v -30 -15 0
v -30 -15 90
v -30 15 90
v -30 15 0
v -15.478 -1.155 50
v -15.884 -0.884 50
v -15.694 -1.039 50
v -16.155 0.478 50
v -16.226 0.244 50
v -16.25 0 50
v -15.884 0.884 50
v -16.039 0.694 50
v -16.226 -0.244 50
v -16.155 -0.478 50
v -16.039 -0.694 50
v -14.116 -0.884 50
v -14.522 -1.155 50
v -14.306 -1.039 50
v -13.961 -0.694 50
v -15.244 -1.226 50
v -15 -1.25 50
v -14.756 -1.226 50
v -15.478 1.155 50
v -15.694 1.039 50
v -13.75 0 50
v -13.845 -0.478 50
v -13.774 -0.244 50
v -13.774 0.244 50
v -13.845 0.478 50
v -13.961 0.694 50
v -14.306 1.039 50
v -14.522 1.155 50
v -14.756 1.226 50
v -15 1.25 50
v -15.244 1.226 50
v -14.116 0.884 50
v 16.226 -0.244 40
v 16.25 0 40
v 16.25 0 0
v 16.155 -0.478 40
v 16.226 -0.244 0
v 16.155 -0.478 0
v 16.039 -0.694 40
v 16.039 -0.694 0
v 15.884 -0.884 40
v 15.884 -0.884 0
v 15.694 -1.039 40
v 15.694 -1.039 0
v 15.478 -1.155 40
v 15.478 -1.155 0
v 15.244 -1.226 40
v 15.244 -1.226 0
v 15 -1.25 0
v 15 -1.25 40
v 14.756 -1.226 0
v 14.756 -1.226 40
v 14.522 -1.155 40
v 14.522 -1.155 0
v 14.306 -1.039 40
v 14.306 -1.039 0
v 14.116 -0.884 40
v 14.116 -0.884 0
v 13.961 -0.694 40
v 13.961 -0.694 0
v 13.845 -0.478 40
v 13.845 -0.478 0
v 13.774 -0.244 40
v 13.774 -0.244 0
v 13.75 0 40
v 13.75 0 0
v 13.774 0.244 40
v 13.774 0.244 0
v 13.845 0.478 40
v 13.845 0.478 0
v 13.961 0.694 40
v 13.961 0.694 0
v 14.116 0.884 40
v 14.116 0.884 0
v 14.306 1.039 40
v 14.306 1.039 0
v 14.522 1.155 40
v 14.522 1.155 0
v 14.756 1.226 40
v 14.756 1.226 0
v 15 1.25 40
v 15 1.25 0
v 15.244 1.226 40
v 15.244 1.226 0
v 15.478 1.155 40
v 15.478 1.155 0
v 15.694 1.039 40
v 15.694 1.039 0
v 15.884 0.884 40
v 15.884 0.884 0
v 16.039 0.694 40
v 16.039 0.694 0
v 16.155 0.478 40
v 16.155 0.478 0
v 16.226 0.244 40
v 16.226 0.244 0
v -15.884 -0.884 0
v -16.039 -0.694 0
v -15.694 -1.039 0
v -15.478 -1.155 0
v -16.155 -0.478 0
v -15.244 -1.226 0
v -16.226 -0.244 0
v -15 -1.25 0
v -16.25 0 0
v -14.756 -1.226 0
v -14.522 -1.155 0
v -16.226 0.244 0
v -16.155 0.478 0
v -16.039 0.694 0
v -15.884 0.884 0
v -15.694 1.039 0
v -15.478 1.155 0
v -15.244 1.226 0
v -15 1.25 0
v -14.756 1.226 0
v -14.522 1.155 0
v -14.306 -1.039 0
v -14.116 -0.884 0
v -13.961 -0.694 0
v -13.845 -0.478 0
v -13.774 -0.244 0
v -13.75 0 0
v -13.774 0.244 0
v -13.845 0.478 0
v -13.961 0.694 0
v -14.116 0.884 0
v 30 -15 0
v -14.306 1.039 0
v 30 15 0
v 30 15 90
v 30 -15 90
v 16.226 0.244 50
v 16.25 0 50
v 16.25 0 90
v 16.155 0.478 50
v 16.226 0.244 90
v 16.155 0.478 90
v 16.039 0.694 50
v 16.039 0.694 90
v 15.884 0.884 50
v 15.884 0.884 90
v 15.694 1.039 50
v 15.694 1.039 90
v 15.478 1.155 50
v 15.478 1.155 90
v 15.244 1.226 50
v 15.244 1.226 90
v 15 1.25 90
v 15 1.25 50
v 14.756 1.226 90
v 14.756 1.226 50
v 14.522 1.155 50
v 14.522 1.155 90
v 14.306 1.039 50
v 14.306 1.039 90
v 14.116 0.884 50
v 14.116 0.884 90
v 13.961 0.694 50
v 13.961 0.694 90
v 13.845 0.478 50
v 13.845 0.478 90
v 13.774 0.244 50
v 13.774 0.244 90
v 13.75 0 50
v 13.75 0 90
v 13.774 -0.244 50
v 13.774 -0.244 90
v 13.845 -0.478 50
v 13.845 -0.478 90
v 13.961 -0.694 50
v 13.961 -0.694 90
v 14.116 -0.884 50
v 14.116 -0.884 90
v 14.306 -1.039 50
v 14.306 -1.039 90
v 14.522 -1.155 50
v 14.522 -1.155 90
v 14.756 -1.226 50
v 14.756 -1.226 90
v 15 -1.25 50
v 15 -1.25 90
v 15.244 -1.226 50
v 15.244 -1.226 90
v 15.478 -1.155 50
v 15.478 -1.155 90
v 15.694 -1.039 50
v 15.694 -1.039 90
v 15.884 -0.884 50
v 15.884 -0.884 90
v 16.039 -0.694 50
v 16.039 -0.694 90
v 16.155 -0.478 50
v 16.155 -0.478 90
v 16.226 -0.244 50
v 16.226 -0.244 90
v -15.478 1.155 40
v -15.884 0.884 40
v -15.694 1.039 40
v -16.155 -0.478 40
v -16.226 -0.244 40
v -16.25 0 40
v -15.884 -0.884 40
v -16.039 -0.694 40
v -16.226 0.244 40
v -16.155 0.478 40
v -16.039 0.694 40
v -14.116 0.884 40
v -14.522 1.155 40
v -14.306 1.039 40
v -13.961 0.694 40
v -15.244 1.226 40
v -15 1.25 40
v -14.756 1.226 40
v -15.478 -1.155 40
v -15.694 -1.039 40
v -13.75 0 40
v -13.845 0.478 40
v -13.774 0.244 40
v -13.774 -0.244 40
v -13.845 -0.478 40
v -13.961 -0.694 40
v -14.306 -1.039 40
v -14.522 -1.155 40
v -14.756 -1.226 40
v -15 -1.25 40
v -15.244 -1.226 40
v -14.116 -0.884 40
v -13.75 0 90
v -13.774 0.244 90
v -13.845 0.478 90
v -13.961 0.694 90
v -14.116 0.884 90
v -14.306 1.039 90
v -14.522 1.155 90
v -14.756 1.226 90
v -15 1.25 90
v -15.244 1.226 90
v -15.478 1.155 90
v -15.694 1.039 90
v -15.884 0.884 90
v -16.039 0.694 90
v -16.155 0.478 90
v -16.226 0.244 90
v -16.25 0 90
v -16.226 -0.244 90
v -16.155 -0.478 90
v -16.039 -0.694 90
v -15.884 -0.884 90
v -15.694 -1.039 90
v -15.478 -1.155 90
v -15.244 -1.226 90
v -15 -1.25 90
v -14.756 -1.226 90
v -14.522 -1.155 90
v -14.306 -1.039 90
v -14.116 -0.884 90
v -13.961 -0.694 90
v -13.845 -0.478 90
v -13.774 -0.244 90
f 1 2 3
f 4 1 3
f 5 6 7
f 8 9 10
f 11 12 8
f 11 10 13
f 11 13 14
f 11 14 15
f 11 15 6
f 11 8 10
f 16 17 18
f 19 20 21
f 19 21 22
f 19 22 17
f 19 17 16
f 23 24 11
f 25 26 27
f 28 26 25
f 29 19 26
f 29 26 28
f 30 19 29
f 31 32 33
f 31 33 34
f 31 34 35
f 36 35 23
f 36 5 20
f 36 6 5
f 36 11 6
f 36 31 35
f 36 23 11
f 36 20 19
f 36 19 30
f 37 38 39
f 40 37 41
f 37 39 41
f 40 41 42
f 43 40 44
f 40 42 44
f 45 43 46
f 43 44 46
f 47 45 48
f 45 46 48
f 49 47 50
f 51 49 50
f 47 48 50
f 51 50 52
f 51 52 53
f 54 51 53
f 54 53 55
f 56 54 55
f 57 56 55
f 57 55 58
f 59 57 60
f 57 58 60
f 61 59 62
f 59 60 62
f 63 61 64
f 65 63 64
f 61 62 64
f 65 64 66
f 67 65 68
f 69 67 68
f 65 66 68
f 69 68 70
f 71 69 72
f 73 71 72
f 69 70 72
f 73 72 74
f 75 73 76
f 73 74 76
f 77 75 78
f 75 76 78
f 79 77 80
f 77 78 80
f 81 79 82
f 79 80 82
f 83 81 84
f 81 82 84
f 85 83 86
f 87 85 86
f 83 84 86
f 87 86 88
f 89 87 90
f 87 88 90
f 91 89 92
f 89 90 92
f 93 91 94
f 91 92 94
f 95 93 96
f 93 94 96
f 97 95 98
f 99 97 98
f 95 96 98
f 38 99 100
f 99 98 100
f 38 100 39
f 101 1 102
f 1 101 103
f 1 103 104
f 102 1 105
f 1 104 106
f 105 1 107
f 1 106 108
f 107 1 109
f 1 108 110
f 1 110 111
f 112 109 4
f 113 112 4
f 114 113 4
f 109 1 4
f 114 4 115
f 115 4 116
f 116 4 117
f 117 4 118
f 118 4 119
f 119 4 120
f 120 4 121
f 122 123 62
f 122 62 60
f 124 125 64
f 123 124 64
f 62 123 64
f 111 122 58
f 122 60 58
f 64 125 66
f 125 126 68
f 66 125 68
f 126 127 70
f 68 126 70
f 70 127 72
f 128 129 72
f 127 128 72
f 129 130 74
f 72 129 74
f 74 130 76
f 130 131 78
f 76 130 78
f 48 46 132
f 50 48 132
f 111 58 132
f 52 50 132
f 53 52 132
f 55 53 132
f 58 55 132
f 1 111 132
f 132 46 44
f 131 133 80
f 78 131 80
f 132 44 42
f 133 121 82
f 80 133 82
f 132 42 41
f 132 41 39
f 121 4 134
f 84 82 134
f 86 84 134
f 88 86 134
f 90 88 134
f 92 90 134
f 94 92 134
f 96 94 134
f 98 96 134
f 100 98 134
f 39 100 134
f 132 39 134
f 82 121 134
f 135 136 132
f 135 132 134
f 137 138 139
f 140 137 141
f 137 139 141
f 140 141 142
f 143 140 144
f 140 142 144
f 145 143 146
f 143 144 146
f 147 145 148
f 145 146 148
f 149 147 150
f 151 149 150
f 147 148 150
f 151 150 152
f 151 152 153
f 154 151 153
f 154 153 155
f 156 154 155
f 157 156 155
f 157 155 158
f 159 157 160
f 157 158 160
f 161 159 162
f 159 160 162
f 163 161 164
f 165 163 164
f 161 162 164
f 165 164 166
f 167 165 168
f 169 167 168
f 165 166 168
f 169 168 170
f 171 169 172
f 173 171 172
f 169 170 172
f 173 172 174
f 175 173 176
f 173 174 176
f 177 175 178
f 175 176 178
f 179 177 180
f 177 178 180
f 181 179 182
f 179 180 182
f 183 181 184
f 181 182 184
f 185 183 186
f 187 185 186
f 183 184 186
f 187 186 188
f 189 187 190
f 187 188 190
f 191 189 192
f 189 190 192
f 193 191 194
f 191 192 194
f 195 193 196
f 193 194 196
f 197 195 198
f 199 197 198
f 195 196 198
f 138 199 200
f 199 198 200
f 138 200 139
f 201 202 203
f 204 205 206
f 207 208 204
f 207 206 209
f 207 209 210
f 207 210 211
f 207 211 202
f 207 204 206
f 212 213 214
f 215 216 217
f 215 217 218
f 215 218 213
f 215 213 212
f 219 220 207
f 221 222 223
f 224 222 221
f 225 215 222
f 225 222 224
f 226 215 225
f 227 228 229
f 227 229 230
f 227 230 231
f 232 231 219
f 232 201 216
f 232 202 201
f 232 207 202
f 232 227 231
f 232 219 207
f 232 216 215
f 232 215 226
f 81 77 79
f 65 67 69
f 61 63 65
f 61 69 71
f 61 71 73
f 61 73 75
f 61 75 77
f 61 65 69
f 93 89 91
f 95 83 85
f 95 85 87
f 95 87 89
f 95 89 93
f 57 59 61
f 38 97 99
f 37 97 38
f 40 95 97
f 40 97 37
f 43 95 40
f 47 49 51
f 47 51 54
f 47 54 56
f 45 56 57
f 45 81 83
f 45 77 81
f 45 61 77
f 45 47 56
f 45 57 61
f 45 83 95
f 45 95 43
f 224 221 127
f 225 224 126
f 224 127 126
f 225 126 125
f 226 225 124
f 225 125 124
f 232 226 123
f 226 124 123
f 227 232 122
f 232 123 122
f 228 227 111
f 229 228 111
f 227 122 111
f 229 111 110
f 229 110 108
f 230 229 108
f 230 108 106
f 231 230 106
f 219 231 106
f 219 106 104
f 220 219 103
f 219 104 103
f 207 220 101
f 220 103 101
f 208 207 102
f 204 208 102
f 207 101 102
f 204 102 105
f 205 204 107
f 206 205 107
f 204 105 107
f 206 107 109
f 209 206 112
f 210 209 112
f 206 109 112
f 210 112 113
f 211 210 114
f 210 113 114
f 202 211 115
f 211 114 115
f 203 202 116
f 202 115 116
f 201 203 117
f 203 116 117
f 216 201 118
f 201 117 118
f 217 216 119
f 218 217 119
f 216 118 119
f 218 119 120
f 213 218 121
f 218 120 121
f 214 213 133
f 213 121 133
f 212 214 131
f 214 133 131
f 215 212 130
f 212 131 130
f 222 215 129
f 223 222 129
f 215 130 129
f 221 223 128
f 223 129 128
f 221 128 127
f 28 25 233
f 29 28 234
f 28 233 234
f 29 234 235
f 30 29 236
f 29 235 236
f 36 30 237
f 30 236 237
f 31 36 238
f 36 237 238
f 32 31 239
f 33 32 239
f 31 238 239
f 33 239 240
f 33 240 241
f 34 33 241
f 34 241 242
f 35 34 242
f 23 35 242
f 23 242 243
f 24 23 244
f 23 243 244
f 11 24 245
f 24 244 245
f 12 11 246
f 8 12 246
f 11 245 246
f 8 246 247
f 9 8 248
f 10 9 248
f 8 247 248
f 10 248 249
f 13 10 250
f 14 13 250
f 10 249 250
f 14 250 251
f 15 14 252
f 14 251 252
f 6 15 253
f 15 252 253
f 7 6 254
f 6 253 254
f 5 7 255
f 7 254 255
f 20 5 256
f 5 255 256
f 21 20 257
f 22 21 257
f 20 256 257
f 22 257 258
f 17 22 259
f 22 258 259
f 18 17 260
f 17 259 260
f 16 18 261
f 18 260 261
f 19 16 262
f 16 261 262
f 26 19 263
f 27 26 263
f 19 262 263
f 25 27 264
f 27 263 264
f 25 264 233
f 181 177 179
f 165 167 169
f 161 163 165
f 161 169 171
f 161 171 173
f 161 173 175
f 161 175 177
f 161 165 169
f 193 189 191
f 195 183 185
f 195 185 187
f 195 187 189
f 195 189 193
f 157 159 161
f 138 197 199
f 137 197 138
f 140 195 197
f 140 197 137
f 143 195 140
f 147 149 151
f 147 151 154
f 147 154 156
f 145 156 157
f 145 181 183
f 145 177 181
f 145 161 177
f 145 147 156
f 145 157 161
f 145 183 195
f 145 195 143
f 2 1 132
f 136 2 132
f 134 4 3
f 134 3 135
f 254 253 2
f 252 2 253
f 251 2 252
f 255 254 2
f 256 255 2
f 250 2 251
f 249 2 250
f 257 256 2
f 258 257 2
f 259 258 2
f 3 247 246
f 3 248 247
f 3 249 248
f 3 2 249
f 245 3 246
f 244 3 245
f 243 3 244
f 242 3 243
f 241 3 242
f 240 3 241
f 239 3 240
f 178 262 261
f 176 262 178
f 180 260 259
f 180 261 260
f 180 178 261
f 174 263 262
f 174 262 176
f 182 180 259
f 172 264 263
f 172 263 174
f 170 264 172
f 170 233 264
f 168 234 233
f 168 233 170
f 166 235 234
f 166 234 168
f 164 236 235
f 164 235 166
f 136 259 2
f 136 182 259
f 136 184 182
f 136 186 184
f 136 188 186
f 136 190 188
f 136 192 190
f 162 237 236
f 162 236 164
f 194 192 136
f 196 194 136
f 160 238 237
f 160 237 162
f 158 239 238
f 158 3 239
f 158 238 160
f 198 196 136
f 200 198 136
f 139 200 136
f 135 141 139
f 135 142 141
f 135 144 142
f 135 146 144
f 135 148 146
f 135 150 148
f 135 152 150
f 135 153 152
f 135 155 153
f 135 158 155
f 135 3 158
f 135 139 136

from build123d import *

# Parameters (mm, degrees)
F0_W     = 60
F0_H     = 30
F1_DEPTH = 90
F3_R     = 1.25
F4_DEPTH = 40
F5_R     = 1.25
F6_DEPTH = 40


with BuildPart() as f1:
    # F0 (on Top) → F1 (new body)
    with BuildSketch(Plane.XY):
        Rectangle(F0_W, F0_H)
    extrude(amount=F1_DEPTH)

    # F3 (on face) → F4 (cut)
    with BuildSketch(Plane(origin=(0, 0, 0), x_dir=(1, 0, 0), z_dir=(0, 0, -1))):
        with Locations((-15, 0)):
            Circle(F3_R)
        with Locations((15, 0)):
            Circle(F3_R)
    extrude(amount=-F4_DEPTH, mode=Mode.SUBTRACT)

    # F5 (on face) → F6 (cut)
    with BuildSketch(Plane.XY.offset(90)):
        with Locations((-15, 0)):
            Circle(F5_R)
        with Locations((15, 0)):
            Circle(F5_R)
    extrude(amount=-F6_DEPTH, mode=Mode.SUBTRACT)


solid = f1.part
